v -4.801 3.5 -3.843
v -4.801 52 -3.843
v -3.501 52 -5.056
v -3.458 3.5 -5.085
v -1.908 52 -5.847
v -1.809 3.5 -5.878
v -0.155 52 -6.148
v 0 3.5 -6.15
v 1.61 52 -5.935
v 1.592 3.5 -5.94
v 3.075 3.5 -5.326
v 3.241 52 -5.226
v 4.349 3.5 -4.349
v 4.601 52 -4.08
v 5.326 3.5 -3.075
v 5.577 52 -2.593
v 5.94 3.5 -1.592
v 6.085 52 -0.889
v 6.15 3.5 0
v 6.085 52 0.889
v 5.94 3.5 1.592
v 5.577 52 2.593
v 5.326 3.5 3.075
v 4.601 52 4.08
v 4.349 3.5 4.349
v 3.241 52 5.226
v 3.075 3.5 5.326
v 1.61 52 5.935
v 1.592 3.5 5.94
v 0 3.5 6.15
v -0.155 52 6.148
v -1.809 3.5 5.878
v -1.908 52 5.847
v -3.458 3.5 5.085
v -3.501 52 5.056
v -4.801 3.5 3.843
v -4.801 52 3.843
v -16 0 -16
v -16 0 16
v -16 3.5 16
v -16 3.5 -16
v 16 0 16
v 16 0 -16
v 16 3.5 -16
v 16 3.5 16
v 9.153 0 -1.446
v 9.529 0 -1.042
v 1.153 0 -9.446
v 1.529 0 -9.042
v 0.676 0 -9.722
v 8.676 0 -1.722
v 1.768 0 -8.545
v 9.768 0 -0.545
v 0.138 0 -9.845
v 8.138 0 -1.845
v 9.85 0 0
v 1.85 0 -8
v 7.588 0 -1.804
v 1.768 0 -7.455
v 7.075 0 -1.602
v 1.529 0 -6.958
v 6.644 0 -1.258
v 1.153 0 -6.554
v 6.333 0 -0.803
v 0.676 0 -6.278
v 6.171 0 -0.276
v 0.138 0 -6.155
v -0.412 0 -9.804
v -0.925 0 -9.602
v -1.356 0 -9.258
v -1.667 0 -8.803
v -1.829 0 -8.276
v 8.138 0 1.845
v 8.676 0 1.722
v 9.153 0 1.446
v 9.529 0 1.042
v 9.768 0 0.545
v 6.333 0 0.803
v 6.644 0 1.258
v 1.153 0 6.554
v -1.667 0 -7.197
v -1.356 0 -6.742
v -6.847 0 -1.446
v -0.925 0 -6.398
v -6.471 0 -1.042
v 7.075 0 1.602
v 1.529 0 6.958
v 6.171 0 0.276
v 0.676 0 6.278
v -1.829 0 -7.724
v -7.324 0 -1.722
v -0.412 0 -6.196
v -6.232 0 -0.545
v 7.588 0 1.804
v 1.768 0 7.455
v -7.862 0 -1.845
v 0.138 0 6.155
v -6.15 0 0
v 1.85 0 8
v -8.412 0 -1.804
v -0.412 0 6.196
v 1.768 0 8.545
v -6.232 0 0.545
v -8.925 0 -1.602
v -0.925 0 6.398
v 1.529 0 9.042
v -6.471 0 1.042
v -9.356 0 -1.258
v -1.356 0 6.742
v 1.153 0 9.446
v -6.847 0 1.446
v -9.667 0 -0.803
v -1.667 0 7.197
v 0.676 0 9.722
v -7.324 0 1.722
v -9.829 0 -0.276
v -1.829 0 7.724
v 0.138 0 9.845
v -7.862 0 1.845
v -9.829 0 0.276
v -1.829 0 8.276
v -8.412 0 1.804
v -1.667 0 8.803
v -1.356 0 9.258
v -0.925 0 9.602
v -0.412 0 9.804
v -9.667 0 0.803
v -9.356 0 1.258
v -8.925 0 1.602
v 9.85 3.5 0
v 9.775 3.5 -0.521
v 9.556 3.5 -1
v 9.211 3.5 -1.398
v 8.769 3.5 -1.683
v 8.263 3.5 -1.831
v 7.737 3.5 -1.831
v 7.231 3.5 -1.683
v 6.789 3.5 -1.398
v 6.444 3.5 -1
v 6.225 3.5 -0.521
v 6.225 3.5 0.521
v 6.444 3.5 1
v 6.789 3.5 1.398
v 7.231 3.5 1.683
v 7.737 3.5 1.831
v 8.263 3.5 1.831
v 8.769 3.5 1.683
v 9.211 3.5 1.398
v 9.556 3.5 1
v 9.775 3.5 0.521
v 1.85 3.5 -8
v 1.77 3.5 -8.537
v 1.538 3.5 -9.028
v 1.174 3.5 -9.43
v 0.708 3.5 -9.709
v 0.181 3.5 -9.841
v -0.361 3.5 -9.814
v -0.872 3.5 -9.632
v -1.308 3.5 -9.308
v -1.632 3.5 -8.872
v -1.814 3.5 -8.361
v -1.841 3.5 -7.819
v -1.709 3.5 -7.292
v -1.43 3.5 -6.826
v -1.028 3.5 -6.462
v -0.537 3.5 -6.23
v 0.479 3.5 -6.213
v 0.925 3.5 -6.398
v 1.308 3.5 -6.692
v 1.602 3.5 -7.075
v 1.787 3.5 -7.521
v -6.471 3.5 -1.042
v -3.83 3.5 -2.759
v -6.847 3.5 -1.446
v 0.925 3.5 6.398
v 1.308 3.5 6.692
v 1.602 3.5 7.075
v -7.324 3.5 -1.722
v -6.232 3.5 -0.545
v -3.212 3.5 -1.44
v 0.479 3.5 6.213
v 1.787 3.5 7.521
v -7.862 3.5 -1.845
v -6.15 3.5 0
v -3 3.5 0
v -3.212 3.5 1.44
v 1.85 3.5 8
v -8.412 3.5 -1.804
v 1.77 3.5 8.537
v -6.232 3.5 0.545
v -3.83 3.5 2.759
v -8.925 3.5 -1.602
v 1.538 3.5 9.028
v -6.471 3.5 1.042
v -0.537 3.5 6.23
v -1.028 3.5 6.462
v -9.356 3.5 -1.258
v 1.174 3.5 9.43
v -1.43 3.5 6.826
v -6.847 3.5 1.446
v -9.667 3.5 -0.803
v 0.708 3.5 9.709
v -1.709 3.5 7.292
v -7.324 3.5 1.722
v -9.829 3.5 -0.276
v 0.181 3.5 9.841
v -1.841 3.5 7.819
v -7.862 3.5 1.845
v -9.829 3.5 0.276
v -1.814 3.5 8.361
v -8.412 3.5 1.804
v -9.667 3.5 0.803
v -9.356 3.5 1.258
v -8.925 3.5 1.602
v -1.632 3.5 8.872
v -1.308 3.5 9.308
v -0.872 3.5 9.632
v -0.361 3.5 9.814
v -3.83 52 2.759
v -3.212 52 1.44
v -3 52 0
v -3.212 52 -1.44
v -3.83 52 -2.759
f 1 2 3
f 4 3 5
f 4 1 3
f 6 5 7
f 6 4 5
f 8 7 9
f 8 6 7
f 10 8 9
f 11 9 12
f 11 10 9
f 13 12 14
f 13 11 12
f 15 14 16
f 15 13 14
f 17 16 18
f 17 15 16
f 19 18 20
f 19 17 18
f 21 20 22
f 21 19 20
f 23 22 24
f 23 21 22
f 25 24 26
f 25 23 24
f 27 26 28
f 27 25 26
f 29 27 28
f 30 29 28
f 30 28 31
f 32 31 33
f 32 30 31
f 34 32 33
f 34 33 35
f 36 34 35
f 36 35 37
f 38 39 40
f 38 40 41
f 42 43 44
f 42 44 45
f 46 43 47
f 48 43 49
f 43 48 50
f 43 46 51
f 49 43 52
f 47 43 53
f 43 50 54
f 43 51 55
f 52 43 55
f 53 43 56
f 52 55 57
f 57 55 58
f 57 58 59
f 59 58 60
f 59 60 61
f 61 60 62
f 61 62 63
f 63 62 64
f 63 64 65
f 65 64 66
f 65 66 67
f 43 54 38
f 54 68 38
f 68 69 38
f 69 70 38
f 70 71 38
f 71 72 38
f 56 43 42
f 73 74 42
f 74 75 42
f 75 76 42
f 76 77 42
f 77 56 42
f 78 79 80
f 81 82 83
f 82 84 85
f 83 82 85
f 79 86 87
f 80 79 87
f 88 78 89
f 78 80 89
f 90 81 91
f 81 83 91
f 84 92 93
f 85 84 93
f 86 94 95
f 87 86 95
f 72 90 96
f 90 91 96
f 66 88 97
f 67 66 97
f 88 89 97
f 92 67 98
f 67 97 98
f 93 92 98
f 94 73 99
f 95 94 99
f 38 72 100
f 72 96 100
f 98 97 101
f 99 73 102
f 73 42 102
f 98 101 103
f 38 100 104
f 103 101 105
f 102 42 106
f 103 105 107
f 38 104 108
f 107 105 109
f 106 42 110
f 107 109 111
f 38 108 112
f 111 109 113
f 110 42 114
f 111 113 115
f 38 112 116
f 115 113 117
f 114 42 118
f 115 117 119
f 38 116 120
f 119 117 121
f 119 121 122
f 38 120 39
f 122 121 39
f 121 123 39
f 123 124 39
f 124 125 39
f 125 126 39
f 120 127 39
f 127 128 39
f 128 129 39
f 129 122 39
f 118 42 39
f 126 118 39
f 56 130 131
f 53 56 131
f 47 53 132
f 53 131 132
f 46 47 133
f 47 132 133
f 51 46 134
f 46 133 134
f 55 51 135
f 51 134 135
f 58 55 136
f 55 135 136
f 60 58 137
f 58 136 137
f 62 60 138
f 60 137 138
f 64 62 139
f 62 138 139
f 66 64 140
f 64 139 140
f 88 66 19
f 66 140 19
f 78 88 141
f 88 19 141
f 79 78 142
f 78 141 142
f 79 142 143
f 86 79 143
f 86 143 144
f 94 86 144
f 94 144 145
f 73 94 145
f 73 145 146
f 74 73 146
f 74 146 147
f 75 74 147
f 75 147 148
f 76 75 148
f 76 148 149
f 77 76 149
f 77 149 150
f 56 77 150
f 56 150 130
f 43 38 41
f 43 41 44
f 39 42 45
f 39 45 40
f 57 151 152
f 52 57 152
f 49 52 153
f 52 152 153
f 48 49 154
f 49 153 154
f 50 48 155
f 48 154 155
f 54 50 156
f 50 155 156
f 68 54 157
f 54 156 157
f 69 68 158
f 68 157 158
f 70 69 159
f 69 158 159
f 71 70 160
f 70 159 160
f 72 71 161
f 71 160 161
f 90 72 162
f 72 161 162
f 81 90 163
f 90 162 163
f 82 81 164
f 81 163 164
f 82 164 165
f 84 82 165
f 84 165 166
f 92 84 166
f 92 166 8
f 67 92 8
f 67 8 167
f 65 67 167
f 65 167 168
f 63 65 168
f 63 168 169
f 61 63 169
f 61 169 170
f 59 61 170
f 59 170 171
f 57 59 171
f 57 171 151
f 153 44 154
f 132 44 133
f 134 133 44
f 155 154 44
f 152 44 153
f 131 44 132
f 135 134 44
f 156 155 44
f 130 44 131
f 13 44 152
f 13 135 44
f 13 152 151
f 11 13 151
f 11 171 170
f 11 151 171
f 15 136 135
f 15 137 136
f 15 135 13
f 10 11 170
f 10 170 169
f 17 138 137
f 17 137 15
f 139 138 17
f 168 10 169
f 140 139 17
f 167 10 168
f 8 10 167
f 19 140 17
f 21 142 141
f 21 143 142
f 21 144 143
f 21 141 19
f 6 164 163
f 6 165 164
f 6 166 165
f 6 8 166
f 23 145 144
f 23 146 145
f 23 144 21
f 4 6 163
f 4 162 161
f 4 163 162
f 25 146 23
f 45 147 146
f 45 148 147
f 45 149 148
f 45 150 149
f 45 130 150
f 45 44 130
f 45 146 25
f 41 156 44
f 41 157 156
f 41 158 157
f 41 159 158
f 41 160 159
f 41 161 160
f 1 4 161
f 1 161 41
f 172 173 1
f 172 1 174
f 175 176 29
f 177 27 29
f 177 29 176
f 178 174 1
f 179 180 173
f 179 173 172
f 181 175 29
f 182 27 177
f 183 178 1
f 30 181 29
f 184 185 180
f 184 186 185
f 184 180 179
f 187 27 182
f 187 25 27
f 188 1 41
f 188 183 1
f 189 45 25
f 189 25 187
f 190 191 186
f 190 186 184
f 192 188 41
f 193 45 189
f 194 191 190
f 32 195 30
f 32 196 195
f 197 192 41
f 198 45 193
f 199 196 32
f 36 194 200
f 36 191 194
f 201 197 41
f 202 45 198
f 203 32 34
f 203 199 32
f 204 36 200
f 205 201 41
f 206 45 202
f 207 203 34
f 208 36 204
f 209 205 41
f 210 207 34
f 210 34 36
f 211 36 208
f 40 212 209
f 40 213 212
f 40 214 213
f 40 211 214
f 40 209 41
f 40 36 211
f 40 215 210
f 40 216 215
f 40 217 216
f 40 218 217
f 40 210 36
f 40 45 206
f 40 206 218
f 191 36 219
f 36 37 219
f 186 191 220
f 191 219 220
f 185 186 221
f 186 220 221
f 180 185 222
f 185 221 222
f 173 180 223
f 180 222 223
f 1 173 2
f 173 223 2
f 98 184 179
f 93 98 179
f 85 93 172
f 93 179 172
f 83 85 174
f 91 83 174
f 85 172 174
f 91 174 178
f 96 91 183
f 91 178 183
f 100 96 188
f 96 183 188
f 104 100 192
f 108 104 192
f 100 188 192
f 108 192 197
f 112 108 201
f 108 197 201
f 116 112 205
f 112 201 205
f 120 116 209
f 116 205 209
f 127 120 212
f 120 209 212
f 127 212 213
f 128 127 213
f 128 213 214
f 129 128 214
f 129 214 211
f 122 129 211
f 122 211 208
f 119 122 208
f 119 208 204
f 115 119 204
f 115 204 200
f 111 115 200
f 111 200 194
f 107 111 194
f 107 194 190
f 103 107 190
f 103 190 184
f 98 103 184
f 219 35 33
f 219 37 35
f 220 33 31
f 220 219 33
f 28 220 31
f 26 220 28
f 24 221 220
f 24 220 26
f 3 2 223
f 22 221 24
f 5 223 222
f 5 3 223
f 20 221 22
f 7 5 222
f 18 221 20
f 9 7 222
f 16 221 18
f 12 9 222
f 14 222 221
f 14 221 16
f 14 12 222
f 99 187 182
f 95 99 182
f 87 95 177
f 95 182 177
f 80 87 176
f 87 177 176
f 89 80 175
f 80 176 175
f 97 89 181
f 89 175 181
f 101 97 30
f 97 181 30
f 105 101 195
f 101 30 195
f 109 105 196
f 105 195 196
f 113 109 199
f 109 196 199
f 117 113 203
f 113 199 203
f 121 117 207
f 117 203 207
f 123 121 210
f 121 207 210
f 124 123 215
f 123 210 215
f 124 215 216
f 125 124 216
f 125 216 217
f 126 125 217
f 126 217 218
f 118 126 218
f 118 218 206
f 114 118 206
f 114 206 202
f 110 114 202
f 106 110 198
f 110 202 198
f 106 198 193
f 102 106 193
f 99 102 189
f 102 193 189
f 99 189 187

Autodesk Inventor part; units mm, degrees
ref_plane "YZ Plane" through (0, 0, 0) normal (1, 0, 0) x (0, 1, 0)
ref_plane "XZ Plane" through (0, 0, 0) normal (0, 1, 0) x (-1, 0, 0)
ref_plane "XY Plane" through (0, 0, 0) normal (0, 0, 1) x (1, 0, 0)
sketch "Эскиз1" plane through (0, 0, 0) normal (0, 1, 0) x (-1, 0, 0)
  line L0 (-16, 16) -> (16, 16)
  line L1 (16, 16) -> (16, -16)
  line L2 (16, -16) -> (-16, -16)
  line L3 (-16, -16) -> (-16, 16)
  line L4 (-16, 16) -> (16, -16) construction
  line L5 (16, 16) -> (-16, -16) construction
  point P0 (0, 0)
  dimension "d0" = 32
  dimension "d1" = 32
extrude "Выдавливание1" add sketch "Эскиз1" along normal blind 3.5
sketch "Эскиз2" plane through (0, 3.5, 0) normal (0, 1, 0) x (1, 0, 0)
  circle A0 centre (0, 8) radius 1.85
  circle A1 centre (-5.6569, 5.6569) radius 1.85
  circle A2 centre (-8, 0) radius 1.85
  circle A3 centre (-5.6569, -5.6569) radius 1.85
  circle A4 centre (0, -8) radius 1.85
  circle A5 centre (5.6569, -5.6569) radius 1.85
  circle A6 centre (8, 0) radius 1.85
  circle A7 centre (5.6569, 5.6569) radius 1.85
  circle A8 centre (0, 0) radius 4
  circle A9 centre (0, 8) radius 1.85
  circle A10 centre (-5.6569, 5.6569) radius 1.85
  circle A11 centre (-8, 0) radius 1.85
  circle A12 centre (-5.6569, -5.6569) radius 1.85
  circle A13 centre (0, -8) radius 1.85
  circle A14 centre (5.6569, -5.6569) radius 1.85
  circle A15 centre (8, 0) radius 1.85
  circle A16 centre (5.6569, 5.6569) radius 1.85
  circle A17 centre (0, 0) radius 4
  circle A18 centre (0, 8) radius 1.85
  circle A19 centre (-5.6569, 5.6569) radius 1.85
  circle A20 centre (-8, 0) radius 1.85
  circle A21 centre (-5.6569, -5.6569) radius 1.85
  circle A22 centre (0, -8) radius 1.85
  circle A23 centre (5.6569, -5.6569) radius 1.85
  circle A24 centre (8, 0) radius 1.85
  circle A25 centre (5.6569, 5.6569) radius 1.85
  circle A26 centre (0, 0) radius 4
  point P0 (0, 0)
  point P1 (0, -16)
  point P2 (0, -16)
  point P3 (0, -16)
extrude "Выдавливание2" cut sketch "Эскиз2" against normal blind 3.5 contours A0 | A2 | A4 | A6
sketch "Эскиз3" plane through (0, 3.5, 0) normal (0, 1, 0) x (1, 0, 0)
  circle A0 centre (0, 0) radius 6.15
  circle A1 centre (-8, 0) radius 1.85 projected
extrude "Выдавливание3" add sketch "Эскиз3" along normal blind 48.5 contours A0
sketch "Эскиз4" plane through (0, 52, 0) normal (0, 1, 0) x (1, 0, 0)
  circle A0 centre (-8, 0) radius 1.85 projected
  circle A1 centre (-8, 0) radius 5
  point P0 (0, 0)
  point P1 (-6.15, 0)
  dimension "d8" = 10
extrude "Выдавливание4" cut sketch "Эскиз4" against normal up to surface (48.5 mm away)
properties part number "000.001.015 - Стойка площадки высокая"
